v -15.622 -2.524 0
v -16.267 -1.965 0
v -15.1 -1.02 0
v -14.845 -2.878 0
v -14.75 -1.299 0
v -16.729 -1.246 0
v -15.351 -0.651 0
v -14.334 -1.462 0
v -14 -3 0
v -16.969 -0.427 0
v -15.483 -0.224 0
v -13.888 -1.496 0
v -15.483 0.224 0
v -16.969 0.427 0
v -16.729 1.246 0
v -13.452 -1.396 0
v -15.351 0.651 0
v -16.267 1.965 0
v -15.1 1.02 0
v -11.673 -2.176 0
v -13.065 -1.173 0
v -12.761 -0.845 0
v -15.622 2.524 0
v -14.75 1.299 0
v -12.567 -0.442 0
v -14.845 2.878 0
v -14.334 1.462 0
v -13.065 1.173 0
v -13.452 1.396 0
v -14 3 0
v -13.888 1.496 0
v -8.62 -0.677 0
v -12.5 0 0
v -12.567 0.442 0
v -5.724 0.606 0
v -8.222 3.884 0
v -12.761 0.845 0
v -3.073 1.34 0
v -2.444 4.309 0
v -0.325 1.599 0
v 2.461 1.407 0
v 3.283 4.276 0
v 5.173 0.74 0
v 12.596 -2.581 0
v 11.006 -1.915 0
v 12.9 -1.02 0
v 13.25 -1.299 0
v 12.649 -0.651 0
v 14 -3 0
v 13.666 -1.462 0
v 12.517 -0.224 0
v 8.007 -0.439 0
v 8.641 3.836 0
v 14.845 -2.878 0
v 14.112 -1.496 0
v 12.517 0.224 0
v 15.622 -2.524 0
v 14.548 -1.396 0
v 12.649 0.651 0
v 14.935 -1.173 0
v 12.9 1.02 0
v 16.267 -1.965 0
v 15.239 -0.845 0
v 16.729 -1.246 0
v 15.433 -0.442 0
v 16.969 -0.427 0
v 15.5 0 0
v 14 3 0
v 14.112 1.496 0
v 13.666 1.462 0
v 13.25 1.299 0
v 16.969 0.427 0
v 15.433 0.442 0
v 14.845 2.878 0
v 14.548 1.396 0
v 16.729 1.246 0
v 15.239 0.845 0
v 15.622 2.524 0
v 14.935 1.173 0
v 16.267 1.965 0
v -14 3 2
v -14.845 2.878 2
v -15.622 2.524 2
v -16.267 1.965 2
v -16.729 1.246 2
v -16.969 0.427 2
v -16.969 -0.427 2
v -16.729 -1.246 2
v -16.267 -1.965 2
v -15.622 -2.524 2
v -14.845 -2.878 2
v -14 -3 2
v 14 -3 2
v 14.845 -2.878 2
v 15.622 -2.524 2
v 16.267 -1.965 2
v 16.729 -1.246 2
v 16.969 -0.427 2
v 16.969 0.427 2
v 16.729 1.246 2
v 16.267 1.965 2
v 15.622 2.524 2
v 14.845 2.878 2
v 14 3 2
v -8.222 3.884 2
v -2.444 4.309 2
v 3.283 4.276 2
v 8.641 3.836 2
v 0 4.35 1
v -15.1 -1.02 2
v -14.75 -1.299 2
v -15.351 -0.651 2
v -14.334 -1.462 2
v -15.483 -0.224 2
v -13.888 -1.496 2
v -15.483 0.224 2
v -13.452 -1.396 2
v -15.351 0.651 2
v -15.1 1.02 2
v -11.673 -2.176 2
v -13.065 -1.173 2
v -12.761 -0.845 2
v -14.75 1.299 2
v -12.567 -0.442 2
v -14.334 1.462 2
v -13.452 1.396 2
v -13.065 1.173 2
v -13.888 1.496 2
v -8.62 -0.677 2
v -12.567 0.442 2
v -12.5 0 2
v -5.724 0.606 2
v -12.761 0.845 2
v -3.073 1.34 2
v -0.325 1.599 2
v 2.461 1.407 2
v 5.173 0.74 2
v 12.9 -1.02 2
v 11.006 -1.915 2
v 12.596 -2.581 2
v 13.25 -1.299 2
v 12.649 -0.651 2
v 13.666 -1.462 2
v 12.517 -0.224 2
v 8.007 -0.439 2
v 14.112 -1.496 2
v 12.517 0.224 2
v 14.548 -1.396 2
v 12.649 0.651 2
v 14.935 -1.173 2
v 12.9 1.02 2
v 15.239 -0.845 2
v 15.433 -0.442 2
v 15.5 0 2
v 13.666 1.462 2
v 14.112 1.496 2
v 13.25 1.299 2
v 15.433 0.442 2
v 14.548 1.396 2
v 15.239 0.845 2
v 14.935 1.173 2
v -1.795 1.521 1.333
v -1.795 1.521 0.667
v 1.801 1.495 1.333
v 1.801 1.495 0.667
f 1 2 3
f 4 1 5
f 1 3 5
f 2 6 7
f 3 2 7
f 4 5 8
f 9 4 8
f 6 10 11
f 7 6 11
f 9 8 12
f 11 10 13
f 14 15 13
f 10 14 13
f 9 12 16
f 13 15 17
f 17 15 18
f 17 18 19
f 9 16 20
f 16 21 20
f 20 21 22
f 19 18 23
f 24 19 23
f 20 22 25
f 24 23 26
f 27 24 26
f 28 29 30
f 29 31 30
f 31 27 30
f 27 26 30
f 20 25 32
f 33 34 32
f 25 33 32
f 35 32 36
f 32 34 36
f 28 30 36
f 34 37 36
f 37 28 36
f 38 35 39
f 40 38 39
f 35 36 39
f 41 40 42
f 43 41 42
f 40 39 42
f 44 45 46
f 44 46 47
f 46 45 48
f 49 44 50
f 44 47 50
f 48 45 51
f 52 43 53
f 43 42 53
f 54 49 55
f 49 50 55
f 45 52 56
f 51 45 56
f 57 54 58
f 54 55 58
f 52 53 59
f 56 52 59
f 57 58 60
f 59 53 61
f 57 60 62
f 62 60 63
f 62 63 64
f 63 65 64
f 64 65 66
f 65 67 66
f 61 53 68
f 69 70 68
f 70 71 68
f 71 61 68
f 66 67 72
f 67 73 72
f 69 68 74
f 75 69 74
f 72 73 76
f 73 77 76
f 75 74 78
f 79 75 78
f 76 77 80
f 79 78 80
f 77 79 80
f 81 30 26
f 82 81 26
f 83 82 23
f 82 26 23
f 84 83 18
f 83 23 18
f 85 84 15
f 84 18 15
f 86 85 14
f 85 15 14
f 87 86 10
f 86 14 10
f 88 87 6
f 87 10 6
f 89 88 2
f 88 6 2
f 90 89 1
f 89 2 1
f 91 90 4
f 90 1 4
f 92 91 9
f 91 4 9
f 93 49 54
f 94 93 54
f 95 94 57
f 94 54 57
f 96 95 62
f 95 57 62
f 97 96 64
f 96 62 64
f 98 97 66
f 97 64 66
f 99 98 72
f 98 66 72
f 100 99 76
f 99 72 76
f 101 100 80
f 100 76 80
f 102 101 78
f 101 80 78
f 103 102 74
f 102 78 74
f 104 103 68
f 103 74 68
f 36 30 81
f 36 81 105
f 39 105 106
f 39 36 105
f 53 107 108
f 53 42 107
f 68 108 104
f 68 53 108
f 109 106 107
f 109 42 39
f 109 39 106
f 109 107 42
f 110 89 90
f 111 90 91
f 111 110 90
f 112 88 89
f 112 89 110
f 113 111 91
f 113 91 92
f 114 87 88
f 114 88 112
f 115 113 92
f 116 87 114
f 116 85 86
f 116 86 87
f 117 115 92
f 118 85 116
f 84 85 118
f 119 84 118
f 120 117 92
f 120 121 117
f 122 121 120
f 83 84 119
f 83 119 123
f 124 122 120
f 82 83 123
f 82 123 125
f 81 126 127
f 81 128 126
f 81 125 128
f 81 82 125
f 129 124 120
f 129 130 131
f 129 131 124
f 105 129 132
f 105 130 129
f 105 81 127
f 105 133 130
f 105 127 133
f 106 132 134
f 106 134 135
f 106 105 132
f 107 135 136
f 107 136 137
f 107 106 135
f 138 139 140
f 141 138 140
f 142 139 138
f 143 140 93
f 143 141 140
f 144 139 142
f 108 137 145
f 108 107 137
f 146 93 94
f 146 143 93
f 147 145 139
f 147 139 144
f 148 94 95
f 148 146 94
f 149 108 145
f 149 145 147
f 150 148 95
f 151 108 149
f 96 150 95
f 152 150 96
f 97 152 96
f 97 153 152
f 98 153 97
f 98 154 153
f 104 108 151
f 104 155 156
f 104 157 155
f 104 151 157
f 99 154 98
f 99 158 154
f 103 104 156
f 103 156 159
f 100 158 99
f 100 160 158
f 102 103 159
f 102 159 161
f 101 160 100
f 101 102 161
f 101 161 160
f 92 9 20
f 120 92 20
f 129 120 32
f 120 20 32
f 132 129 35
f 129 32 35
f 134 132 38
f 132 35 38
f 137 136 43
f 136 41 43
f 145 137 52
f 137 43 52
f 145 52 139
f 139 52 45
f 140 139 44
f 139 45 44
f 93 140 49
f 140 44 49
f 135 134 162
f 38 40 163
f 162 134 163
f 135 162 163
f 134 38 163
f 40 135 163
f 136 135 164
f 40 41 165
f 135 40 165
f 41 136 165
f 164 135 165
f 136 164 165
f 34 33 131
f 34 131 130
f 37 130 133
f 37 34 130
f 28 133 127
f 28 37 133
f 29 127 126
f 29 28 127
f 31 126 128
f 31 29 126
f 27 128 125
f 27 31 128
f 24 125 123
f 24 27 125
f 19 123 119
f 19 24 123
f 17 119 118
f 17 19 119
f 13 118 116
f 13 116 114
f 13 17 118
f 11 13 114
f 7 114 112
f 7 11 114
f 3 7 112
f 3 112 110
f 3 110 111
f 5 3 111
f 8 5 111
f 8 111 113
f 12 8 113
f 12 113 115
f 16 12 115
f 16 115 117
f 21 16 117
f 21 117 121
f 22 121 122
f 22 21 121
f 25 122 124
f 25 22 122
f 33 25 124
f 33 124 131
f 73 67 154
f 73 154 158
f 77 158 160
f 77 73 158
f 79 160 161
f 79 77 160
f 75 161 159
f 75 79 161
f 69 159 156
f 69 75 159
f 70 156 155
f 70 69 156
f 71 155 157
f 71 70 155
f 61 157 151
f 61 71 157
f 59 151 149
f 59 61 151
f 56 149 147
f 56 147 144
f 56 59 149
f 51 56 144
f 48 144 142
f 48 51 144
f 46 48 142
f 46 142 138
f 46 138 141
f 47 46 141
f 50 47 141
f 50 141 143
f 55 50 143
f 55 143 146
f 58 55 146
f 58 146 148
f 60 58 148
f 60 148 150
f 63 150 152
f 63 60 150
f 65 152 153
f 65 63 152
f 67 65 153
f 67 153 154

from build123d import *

# Parameters (mm, degrees)
SKETCH1_R           = 1.5
BOSS_EXTRUDE1_DEPTH = 2


with BuildPart() as part:
    # Sketch1 → Boss-Extrude1 (new body)
    with BuildSketch(Plane.XY):
        with BuildLine():
            ThreePointArc((-14, 3), (-17, 0), (-14, -3))
            add(Edge.make_bspline(
                [(-14, -3), (-10.110775288, -2.025488943), (-6.332313911, 1.681383892), (6.35903931, 1.579555666), (10.137986604, -2.11235599), (14, -3)],
                knots=[0, 0, 0, 0, 0.449202302, 0.549202302, 1, 1, 1, 1], degree=3))
            ThreePointArc((14, -3), (17, 0), (14, 3))
            add(Edge.make_bspline(
                [(-14, 3), (0, 5.7), (14, 3)],
                knots=[0, 0, 0, 1, 1, 1], degree=2))
        make_face()
        with Locations((-14, 0)):
            Circle(SKETCH1_R, mode=Mode.SUBTRACT)
        with Locations((14, 0)):
            Circle(SKETCH1_R, mode=Mode.SUBTRACT)
    extrude(amount=BOSS_EXTRUDE1_DEPTH)


solid = part.part
